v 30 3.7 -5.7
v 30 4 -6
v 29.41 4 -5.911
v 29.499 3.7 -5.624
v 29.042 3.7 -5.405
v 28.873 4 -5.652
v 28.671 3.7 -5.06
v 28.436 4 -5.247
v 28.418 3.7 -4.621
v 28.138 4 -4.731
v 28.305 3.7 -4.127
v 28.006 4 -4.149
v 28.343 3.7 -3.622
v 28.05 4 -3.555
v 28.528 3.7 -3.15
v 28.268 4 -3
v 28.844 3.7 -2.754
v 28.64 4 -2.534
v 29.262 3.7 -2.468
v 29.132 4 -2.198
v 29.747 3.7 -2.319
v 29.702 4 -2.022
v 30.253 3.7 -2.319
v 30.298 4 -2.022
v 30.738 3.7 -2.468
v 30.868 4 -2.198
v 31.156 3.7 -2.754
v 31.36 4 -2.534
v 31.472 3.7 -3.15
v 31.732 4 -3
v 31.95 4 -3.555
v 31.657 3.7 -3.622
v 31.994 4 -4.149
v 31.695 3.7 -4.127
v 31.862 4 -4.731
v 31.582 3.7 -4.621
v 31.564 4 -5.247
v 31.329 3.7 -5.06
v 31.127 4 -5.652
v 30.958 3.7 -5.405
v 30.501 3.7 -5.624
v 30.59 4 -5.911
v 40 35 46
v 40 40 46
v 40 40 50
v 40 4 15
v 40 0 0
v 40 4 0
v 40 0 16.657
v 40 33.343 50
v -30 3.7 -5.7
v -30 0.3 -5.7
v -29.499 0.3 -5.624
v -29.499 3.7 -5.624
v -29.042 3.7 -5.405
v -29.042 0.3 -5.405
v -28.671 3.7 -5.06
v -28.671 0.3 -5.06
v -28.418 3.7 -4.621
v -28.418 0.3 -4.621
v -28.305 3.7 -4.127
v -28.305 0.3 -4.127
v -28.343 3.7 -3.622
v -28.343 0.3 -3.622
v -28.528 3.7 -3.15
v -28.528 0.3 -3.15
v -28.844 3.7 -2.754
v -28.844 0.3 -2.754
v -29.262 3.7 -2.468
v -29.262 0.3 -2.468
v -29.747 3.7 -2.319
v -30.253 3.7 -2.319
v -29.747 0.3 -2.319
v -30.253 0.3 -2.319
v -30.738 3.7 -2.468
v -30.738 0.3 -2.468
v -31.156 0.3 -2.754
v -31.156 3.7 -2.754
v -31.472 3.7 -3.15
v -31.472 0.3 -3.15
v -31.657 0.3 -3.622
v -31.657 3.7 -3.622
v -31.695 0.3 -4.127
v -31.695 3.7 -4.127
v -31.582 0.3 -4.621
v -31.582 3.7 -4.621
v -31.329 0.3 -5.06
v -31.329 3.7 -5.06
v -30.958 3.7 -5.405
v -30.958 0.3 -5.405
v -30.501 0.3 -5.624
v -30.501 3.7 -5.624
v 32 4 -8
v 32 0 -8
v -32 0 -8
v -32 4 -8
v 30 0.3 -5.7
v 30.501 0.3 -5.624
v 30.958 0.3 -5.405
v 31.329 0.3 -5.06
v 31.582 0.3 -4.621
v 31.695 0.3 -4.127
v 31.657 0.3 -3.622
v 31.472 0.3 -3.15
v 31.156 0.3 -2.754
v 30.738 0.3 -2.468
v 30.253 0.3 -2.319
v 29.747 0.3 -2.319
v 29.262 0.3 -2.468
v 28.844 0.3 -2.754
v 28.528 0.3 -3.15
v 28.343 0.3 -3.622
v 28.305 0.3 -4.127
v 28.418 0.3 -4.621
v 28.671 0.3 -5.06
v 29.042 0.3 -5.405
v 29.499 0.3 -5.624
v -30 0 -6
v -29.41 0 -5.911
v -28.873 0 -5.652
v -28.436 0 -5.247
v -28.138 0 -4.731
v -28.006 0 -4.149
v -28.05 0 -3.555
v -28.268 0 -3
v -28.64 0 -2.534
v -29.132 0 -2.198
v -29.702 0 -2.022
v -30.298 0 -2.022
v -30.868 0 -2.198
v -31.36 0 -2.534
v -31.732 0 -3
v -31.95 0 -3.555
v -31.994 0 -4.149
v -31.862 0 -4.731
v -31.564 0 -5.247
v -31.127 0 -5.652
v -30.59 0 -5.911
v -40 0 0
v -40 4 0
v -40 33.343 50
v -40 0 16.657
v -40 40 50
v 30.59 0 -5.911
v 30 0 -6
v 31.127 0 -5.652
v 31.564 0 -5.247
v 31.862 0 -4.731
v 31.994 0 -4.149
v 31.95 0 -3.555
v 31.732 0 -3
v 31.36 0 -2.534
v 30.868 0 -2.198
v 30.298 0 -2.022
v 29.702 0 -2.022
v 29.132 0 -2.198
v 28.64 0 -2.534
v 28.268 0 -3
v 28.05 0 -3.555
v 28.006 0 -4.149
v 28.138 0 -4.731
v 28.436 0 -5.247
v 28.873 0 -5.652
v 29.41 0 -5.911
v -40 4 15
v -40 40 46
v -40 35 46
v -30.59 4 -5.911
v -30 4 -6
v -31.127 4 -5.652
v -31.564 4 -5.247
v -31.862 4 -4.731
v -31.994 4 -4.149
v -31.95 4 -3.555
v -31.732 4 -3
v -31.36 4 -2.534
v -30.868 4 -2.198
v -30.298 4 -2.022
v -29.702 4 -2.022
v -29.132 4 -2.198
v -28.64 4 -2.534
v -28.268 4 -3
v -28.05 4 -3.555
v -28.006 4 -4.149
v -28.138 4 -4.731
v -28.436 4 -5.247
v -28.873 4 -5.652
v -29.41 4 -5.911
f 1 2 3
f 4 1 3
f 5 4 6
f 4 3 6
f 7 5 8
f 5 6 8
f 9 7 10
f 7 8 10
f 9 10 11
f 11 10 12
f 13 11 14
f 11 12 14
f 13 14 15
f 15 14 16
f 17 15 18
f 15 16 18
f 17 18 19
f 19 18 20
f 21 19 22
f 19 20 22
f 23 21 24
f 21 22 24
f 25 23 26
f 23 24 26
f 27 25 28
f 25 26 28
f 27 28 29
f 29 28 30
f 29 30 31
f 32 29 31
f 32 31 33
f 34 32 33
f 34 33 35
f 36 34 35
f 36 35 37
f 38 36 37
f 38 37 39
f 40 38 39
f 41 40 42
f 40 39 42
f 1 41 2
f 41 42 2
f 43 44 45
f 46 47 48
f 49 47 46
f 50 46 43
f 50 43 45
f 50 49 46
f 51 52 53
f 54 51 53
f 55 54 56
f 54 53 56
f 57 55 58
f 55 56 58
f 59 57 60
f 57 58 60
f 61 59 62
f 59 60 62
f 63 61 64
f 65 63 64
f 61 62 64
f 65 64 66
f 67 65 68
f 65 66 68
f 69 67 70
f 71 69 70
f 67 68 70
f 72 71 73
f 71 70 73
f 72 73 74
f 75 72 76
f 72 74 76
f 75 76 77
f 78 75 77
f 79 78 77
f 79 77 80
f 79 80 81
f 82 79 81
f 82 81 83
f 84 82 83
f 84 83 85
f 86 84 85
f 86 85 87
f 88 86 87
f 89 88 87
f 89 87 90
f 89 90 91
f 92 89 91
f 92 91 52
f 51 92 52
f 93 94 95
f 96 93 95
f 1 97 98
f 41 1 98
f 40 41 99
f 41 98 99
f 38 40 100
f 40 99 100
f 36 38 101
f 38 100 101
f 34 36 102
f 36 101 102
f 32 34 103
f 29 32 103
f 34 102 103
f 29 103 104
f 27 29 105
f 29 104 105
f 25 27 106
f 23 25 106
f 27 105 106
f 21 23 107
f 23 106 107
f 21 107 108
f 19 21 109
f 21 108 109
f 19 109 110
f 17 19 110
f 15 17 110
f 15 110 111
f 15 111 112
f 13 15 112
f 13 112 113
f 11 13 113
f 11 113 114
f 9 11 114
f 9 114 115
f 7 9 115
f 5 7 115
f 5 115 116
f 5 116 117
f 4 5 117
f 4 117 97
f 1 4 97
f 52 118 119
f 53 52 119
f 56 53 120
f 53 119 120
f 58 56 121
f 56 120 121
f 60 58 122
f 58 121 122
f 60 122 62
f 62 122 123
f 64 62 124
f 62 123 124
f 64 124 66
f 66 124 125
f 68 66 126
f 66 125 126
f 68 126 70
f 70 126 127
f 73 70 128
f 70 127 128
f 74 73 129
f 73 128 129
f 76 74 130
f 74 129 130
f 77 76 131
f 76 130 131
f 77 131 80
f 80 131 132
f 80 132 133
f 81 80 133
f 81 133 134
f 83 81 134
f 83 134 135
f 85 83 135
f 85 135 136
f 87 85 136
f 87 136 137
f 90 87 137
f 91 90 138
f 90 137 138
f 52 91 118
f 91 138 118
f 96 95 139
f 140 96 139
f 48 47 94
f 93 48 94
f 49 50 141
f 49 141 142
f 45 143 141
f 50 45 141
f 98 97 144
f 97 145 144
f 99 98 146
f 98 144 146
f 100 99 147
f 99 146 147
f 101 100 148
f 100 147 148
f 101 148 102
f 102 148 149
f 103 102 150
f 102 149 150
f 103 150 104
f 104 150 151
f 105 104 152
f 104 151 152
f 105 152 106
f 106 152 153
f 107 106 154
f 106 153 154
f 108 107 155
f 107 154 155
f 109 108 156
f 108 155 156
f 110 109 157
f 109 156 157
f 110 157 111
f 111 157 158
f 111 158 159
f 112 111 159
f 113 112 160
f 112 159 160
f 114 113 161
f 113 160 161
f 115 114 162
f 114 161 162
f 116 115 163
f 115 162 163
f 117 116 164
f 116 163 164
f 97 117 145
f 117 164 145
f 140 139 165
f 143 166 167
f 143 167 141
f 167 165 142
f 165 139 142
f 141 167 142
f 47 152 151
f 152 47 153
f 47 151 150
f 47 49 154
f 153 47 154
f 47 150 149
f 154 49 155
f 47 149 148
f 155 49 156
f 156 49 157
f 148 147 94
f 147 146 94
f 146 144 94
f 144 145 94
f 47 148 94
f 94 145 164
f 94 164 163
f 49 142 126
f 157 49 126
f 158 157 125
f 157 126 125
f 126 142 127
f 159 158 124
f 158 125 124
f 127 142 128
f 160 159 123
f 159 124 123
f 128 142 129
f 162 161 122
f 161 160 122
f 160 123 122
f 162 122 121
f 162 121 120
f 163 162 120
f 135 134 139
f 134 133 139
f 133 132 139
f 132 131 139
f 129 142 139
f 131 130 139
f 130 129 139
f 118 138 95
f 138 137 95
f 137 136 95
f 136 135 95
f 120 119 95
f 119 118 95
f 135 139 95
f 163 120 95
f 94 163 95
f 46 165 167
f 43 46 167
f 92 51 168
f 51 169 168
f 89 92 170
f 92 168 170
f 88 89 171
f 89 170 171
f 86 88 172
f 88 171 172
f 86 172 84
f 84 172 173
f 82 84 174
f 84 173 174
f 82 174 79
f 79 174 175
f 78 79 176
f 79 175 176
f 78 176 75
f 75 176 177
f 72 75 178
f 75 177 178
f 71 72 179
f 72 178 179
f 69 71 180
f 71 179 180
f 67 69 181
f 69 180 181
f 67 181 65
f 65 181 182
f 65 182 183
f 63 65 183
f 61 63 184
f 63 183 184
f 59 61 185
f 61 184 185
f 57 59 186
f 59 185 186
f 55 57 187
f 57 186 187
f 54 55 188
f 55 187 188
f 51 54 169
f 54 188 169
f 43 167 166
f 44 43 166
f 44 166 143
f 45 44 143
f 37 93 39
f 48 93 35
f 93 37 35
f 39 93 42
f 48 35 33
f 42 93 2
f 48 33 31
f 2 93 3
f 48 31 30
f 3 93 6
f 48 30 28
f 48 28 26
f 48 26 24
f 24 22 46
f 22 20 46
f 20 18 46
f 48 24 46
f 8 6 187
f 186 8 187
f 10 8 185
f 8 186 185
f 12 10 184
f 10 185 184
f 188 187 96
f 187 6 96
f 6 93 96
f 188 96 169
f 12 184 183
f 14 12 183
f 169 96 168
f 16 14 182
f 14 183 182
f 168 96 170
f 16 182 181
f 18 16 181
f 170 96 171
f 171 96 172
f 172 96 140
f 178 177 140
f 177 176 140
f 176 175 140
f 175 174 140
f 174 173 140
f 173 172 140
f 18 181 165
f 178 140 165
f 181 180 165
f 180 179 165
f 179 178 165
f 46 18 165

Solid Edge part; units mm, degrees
sketch "Sketch1" plane through (0, 0, 0) normal (1, 0, 0) x (0, 1, 0)
  line L0 (0, 0) -> (4, 0)
  line L1 (4, 0) -> (4, 15)
  line L2 (4, 15) -> (35, 46)
  line L3 (35, 46) -> (40, 46)
  line L4 (40, 46) -> (40, 50)
  line L5 (40, 50) -> (33.3431, 50)
  line L6 (33.3431, 50) -> (0, 16.6569)
  line L7 (0, 16.6569) -> (0, 0)
  dimension "D1" = 50
  dimension "D2" = 15
  dimension "D3" = 4
  dimension "D4" = 40
extrude "Protrusion1" add sketch "Sketch1" along normal mid plane 80
sketch "Sketch2" plane through (0, 0, 8.3284) normal (0, -1, 0) x (1, 0, 0)
  line L0 (-40, -8.3284) -> (40, -8.3284)
  line L1 (40, -8.3284) -> (32, -16.3284)
  line L2 (32, -16.3284) -> (-32, -16.3284)
  line L3 (-32, -16.3284) -> (-40, -8.3284)
  dimension "D1" = 80
  dimension "D2" = 8
  dimension "D3" = 64
extrude "Protrusion2" add sketch "Sketch2" against normal up to vertex (4 mm away)
hole "Hole1" at (-30, 0, -4) direction (0, 1, 0) diameter 3.4 end up to next start chamfer 0.3 start chamfer angle 45 end chamfer 0.3 end chamfer angle 45
hole "Hole2" at (30, 0, -4) direction (0, 1, 0) diameter 3.4 end up to next start chamfer 0.3 start chamfer angle 45 end chamfer 0.3 end chamfer angle 45
properties material "Polyethylene, low density"
